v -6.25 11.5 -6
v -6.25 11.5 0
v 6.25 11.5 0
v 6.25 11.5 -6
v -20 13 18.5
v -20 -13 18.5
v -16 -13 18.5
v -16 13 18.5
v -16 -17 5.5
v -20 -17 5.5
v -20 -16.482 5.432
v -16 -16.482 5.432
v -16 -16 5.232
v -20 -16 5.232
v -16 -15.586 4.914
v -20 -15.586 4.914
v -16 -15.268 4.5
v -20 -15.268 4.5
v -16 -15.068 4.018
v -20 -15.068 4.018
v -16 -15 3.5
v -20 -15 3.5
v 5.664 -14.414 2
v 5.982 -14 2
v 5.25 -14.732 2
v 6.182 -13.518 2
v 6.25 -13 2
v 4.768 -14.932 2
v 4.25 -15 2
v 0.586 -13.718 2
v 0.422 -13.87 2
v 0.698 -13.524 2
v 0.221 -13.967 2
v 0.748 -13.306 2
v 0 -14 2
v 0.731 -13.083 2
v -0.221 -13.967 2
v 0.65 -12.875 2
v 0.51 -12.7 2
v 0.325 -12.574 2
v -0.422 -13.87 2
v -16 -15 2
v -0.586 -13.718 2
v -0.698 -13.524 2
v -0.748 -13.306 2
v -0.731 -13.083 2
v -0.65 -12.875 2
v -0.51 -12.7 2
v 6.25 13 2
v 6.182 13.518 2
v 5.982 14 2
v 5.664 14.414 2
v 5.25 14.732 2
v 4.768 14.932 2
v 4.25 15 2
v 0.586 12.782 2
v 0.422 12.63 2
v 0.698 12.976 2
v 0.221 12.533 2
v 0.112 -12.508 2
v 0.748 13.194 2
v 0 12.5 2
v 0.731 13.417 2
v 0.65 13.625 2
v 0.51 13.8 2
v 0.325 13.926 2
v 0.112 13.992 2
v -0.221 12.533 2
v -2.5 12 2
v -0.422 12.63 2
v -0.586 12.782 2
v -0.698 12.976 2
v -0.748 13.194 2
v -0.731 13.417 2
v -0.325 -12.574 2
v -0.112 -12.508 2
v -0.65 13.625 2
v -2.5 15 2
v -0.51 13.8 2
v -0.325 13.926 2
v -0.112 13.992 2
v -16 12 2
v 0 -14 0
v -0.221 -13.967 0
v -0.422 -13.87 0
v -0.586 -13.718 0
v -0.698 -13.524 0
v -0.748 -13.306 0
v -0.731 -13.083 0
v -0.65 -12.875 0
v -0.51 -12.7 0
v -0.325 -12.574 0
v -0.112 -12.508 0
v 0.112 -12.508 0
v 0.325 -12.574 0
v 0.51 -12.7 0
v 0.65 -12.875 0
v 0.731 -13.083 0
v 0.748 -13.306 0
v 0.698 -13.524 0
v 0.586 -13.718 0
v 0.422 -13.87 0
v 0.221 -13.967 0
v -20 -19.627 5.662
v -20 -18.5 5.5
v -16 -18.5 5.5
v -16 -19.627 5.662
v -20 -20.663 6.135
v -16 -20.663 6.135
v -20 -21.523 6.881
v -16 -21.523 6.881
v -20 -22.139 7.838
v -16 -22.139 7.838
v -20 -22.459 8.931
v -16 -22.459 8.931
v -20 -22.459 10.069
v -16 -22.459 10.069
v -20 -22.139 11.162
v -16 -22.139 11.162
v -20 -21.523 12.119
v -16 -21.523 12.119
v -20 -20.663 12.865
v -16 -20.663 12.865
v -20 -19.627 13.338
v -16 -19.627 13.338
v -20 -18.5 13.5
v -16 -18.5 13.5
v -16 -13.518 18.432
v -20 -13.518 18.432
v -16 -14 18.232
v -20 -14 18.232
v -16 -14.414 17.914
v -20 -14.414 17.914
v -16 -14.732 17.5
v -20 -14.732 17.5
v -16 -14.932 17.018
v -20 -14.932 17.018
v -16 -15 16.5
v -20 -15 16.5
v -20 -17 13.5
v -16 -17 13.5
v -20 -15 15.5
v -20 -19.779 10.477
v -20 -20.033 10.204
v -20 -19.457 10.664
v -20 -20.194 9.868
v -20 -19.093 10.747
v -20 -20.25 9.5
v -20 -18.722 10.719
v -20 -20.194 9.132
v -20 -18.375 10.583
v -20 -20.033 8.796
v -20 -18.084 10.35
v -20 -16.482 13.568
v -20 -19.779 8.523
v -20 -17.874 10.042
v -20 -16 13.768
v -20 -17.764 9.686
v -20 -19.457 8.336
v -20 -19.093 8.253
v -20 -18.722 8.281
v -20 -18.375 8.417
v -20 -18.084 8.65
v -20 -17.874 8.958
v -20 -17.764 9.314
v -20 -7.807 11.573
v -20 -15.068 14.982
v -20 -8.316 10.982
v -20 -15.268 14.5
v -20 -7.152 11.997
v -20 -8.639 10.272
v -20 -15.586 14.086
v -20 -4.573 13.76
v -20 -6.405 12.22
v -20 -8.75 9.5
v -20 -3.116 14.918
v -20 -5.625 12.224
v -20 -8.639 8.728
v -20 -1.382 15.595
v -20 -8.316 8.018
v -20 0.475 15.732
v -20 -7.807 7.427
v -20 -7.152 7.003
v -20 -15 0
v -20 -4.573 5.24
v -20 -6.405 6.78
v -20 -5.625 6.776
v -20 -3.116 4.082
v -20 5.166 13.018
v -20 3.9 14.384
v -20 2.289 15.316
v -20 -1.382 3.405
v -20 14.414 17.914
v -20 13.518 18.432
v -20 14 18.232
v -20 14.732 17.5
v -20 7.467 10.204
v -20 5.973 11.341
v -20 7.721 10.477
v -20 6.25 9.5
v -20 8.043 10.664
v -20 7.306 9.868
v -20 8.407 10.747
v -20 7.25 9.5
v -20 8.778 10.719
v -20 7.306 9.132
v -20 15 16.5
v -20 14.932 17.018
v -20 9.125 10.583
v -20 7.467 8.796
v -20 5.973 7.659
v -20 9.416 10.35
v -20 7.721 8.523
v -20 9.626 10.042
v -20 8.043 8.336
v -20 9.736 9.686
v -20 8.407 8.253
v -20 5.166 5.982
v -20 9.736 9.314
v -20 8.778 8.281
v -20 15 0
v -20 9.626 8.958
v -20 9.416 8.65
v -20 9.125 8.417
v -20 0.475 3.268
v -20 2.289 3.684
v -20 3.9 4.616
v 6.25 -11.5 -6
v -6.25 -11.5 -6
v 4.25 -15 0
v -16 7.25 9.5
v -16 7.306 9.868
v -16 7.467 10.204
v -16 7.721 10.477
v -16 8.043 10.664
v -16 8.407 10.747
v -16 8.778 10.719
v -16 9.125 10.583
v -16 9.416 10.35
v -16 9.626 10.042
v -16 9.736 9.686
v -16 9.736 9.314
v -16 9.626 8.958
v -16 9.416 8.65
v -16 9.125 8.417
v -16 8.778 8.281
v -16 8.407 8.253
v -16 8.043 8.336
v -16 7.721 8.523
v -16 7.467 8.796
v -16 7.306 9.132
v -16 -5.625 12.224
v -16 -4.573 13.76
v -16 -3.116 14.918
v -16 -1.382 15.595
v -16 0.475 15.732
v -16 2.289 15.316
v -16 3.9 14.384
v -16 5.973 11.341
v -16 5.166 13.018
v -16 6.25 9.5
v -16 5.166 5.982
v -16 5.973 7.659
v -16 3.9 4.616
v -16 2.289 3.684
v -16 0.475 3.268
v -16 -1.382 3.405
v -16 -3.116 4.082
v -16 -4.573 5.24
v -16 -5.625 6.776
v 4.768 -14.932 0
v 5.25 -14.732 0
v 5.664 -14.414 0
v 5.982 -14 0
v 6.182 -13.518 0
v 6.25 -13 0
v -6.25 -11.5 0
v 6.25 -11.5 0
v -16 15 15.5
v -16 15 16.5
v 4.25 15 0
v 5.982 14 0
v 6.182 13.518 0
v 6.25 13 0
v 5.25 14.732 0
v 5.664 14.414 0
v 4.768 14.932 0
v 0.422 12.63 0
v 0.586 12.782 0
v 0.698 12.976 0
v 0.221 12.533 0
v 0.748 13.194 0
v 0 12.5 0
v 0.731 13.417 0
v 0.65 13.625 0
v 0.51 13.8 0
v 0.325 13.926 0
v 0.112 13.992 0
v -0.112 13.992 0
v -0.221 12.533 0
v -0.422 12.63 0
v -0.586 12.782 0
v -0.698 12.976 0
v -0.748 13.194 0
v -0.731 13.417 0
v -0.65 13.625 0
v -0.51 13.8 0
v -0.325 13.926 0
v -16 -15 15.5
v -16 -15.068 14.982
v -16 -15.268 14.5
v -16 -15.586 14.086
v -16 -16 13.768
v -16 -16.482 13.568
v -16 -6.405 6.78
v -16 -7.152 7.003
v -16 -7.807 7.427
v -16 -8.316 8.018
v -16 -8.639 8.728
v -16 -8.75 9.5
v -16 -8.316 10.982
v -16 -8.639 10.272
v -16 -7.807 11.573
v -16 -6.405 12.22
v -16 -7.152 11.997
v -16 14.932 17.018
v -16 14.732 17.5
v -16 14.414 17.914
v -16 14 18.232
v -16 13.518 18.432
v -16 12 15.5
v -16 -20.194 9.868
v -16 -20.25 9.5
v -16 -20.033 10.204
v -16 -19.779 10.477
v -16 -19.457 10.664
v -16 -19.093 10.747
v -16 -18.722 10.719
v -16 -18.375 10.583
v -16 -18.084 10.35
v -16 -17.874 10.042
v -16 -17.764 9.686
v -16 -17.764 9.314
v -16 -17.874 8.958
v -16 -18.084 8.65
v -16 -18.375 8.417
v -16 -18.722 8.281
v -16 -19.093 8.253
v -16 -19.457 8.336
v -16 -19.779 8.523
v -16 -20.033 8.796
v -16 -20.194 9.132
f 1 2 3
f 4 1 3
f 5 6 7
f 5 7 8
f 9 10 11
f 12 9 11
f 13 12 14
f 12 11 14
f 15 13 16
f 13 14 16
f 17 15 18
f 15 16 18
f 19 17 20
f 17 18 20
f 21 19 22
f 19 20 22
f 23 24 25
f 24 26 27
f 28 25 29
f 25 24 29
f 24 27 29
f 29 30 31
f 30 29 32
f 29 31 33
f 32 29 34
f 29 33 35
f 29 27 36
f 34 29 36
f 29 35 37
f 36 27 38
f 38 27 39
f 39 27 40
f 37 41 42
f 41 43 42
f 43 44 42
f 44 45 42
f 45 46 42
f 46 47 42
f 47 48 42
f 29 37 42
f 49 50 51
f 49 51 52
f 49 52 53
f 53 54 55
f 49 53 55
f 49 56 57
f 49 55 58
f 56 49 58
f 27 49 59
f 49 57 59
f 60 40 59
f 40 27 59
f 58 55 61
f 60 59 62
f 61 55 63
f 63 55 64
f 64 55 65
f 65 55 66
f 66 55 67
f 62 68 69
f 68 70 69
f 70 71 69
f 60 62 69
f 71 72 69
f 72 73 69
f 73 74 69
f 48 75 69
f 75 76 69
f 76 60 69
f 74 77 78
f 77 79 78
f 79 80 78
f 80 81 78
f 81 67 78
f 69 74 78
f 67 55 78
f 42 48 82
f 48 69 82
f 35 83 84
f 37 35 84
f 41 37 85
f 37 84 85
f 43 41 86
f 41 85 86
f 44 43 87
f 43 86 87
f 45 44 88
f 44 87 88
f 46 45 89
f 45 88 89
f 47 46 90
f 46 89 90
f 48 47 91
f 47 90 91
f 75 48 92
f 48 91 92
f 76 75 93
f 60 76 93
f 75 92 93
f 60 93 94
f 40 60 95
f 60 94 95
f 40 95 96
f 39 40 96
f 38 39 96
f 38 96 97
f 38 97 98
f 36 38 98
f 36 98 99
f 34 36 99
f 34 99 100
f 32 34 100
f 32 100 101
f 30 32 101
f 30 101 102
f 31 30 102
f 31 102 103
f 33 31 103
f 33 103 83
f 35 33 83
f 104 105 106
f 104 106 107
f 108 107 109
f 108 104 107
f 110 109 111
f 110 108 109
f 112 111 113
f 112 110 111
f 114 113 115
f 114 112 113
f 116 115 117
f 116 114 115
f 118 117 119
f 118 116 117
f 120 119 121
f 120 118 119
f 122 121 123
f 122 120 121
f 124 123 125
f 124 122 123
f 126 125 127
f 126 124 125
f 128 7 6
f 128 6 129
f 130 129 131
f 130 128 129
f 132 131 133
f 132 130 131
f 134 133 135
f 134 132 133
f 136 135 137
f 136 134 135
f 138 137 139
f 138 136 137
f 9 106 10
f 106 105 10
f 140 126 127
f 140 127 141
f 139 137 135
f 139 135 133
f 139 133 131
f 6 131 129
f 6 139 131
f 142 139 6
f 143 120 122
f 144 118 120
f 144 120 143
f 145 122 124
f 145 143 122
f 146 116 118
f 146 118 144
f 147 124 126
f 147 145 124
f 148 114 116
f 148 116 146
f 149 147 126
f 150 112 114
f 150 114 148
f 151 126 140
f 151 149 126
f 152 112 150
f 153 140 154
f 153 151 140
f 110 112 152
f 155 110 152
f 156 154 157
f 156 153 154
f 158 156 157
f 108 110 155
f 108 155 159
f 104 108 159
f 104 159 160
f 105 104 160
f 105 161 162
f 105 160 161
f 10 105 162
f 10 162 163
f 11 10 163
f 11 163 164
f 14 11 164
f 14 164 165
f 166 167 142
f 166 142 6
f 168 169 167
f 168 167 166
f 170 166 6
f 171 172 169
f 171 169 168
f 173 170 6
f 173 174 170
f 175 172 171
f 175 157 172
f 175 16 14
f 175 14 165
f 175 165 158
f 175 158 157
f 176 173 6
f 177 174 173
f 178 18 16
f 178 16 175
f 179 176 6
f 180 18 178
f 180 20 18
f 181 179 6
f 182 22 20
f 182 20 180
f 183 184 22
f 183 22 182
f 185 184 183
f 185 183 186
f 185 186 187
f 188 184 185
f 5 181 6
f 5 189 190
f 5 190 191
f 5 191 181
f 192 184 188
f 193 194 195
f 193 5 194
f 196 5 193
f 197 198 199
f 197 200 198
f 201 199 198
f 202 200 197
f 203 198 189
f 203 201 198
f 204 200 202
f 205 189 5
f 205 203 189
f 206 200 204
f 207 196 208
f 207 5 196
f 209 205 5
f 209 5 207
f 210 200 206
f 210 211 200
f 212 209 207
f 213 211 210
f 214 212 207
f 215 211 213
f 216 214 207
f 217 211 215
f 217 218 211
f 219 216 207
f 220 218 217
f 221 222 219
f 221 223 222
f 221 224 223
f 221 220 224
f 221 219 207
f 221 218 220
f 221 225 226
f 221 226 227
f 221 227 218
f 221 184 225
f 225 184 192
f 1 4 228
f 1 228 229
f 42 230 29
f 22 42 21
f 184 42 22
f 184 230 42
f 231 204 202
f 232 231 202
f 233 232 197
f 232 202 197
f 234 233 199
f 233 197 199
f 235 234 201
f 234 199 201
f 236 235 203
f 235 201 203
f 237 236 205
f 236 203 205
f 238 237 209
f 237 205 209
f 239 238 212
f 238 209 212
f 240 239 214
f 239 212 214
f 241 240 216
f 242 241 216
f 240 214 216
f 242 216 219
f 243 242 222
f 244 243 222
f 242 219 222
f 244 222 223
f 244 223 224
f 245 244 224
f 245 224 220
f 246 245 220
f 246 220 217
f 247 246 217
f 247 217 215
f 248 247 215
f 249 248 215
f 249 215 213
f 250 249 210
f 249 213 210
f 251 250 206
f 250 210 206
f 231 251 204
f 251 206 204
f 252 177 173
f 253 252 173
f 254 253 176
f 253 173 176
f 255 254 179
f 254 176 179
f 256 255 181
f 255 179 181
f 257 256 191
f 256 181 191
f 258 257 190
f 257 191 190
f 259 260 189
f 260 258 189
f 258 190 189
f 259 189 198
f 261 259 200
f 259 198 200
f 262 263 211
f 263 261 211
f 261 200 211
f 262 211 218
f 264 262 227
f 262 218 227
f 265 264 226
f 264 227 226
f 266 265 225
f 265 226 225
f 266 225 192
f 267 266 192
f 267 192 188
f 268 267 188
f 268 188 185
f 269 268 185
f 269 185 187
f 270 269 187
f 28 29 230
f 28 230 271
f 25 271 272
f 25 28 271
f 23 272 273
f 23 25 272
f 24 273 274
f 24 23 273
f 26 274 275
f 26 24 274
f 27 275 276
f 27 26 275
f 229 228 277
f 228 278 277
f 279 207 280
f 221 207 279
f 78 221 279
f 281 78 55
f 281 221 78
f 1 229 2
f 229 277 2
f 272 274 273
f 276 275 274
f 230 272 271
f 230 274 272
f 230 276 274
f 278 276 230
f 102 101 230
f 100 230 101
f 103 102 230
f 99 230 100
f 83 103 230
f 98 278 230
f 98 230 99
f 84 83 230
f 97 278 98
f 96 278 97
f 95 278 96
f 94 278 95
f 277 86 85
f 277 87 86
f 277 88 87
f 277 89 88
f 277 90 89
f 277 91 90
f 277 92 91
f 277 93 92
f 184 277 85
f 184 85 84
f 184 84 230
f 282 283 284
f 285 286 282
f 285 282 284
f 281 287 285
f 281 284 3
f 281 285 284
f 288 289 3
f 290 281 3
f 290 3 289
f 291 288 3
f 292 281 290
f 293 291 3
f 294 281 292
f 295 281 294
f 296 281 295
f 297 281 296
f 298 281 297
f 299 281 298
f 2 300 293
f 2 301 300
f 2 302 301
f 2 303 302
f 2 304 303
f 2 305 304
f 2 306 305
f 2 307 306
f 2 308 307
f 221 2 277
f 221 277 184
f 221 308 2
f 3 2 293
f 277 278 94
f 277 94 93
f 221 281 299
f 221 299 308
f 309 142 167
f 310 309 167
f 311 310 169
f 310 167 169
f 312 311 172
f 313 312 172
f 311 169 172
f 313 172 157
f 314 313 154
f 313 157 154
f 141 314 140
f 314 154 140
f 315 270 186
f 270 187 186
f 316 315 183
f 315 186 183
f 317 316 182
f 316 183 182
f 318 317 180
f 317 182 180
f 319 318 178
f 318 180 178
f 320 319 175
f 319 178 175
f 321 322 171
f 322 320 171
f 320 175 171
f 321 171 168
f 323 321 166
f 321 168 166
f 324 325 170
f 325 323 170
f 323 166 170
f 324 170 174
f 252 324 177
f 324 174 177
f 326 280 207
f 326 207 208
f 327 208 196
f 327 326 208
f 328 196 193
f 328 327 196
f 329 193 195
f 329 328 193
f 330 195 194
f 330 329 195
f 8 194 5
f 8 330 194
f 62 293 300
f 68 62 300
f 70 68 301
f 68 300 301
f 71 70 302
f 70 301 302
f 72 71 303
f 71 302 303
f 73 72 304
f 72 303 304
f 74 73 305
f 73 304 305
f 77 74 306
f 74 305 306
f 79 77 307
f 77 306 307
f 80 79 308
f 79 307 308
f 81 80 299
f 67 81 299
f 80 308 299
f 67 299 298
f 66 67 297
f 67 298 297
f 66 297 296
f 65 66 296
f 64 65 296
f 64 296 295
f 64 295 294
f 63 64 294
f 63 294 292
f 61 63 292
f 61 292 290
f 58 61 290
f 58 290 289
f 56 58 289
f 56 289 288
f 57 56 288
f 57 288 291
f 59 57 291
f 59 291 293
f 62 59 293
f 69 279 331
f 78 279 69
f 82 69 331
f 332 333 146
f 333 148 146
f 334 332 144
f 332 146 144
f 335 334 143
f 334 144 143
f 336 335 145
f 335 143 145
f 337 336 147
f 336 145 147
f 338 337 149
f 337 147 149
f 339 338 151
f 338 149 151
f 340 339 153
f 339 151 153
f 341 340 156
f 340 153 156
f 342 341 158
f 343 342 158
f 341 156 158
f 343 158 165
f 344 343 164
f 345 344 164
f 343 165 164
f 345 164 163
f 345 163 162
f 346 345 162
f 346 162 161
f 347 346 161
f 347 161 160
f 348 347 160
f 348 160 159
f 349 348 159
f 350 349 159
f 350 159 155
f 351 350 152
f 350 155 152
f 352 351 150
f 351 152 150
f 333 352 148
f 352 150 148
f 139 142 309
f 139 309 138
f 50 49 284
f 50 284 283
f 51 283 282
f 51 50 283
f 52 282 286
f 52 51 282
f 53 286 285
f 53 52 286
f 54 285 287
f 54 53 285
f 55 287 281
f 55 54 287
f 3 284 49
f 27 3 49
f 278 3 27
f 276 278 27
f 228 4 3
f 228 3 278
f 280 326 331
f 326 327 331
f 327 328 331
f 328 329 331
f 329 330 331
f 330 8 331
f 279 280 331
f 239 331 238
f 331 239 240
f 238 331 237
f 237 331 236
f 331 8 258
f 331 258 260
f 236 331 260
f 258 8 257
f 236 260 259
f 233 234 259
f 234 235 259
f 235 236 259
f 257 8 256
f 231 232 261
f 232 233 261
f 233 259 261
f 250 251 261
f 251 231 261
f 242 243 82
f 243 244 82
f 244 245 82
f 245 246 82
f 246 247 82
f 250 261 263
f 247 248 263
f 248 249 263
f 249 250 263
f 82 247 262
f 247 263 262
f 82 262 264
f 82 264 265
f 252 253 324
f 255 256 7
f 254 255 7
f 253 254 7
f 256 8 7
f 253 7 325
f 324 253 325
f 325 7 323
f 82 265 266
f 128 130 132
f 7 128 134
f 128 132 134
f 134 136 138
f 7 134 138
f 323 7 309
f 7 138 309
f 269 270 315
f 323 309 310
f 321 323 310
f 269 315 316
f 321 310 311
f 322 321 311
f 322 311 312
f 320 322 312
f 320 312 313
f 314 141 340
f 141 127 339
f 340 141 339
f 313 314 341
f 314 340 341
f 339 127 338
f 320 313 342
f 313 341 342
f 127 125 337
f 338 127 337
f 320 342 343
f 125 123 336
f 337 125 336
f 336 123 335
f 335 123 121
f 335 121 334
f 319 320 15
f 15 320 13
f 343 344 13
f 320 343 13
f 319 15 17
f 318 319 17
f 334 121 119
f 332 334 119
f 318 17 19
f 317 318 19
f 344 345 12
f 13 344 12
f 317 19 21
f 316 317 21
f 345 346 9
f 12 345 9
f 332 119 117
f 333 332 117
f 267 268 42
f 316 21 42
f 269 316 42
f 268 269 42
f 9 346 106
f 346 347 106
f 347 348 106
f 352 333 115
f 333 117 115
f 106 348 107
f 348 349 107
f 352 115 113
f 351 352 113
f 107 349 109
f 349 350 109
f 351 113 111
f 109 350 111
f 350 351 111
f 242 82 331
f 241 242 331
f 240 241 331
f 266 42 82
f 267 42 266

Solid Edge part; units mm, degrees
sketch "Sketch1" plane through (0, 0, 0) normal (0, 0, 1) x (1, 0, 0)
  line L0 (20, -15) -> (-20, -15)
  line L1 (-20, -15) -> (-20, 15)
  line L2 (-20, 15) -> (20, 15)
  line L3 (20, 15) -> (20, -15)
extrude "Protrusion1" add sketch "Sketch1" along normal blind 2
sketch "Sketch2" plane through (0, 0, 0) normal (0, 0, -1) x (1, 0, 0)
  line L0 (6.25, -11.5) -> (6.25, 11.5)
  line L1 (6.25, 11.5) -> (-6.25, 11.5)
  line L2 (-6.25, 11.5) -> (-6.25, -11.5)
  line L3 (-6.25, -11.5) -> (6.25, -11.5)
extrude "ExtrudedProtrusion_2" add sketch "Sketch2" along normal blind 6
sketch "Sketch3" plane through (-20, 0, 1) normal (-1, 0, 0) x (0, -1, 0)
  line L0 (-15, 17.5) -> (-15, 1)
  line L1 (-15, 1) -> (15, 1)
  line L2 (15, 1) -> (15, 2.5)
  arc A0 (17, 4.5) -> (15, 2.5) centre (17, 2.5) ccw
  line L3 (18.5, 4.5) -> (17, 4.5)
  line L4 (18.5, 12.5) -> (17, 12.5)
  arc A1 (15, 14.5) -> (17, 12.5) centre (17, 14.5) ccw
  line L5 (15, 14.5) -> (15, 17.5)
  line L6 (15, 17.5) -> (-15, 17.5)
  arc A2 (18.5, 12.5) -> (18.5, 4.5) centre (18.5, 8.5) cw
  arc A3 (5.625, 5.7757) -> (5.625, 11.2243) centre (0, 8.5) cw
  arc A4 (5.625, 11.2243) -> (5.625, 5.7757) centre (6, 8.5) cw
extrude "ExtrudedProtrusion_3" add sketch "Sketch3" against normal blind 4
sketch "Sketch4" plane through (0, 0, 0) normal (0, 0, -1) x (0, -1, 0)
  circle A0 centre (-13.25, 0) radius 0.75
  circle A1 centre (13.25, 0) radius 0.75
extrude "ExtrudedCutout_1" cut sketch "Sketch4" against normal blind 30
sketch "Sketch5" plane through (0, 15, 9.25) normal (0, 1, 0) x (-1, 0, 0)
  line L0 (16, 6.25) -> (2.5, -7.25)
  line L1 (2.5, -7.25) -> (16, -7.25)
  line L2 (16, -7.25) -> (16, 6.25)
extrude "ExtrudedProtrusion_4" add sketch "Sketch5" against normal blind 3
sketch "Sketch6" plane through (0, 0, 0) normal (0, 0, -1) x (0, 1, 0)
  line L0 (-15, 20) -> (15, 20)
  line L1 (15, 20) -> (15, 6.25)
  line L2 (15, 6.25) -> (-15, 6.25)
  line L3 (-15, 6.25) -> (-15, 20)
extrude "ExtrudedCutout_2" cut sketch "Sketch6" against normal blind 11
fillet "Round_1" radius 2 2 edges at (6.25, -15, 1) (6.25, 15, 1)
fillet "Round_2" radius 2 2 edges at (-18, 15, 18.5) (-18, -15, 18.5)
sketch "Sketch7" plane through (-20, 0, 1) normal (-1, 0, 0) x (0, -1, 0)
  circle A0 centre (-8.5, 8.5) radius 1.25
  circle A1 centre (19, 8.5) radius 1.25
extrude "ExtrudedCutout_3" cut sketch "Sketch7" against normal blind 8
